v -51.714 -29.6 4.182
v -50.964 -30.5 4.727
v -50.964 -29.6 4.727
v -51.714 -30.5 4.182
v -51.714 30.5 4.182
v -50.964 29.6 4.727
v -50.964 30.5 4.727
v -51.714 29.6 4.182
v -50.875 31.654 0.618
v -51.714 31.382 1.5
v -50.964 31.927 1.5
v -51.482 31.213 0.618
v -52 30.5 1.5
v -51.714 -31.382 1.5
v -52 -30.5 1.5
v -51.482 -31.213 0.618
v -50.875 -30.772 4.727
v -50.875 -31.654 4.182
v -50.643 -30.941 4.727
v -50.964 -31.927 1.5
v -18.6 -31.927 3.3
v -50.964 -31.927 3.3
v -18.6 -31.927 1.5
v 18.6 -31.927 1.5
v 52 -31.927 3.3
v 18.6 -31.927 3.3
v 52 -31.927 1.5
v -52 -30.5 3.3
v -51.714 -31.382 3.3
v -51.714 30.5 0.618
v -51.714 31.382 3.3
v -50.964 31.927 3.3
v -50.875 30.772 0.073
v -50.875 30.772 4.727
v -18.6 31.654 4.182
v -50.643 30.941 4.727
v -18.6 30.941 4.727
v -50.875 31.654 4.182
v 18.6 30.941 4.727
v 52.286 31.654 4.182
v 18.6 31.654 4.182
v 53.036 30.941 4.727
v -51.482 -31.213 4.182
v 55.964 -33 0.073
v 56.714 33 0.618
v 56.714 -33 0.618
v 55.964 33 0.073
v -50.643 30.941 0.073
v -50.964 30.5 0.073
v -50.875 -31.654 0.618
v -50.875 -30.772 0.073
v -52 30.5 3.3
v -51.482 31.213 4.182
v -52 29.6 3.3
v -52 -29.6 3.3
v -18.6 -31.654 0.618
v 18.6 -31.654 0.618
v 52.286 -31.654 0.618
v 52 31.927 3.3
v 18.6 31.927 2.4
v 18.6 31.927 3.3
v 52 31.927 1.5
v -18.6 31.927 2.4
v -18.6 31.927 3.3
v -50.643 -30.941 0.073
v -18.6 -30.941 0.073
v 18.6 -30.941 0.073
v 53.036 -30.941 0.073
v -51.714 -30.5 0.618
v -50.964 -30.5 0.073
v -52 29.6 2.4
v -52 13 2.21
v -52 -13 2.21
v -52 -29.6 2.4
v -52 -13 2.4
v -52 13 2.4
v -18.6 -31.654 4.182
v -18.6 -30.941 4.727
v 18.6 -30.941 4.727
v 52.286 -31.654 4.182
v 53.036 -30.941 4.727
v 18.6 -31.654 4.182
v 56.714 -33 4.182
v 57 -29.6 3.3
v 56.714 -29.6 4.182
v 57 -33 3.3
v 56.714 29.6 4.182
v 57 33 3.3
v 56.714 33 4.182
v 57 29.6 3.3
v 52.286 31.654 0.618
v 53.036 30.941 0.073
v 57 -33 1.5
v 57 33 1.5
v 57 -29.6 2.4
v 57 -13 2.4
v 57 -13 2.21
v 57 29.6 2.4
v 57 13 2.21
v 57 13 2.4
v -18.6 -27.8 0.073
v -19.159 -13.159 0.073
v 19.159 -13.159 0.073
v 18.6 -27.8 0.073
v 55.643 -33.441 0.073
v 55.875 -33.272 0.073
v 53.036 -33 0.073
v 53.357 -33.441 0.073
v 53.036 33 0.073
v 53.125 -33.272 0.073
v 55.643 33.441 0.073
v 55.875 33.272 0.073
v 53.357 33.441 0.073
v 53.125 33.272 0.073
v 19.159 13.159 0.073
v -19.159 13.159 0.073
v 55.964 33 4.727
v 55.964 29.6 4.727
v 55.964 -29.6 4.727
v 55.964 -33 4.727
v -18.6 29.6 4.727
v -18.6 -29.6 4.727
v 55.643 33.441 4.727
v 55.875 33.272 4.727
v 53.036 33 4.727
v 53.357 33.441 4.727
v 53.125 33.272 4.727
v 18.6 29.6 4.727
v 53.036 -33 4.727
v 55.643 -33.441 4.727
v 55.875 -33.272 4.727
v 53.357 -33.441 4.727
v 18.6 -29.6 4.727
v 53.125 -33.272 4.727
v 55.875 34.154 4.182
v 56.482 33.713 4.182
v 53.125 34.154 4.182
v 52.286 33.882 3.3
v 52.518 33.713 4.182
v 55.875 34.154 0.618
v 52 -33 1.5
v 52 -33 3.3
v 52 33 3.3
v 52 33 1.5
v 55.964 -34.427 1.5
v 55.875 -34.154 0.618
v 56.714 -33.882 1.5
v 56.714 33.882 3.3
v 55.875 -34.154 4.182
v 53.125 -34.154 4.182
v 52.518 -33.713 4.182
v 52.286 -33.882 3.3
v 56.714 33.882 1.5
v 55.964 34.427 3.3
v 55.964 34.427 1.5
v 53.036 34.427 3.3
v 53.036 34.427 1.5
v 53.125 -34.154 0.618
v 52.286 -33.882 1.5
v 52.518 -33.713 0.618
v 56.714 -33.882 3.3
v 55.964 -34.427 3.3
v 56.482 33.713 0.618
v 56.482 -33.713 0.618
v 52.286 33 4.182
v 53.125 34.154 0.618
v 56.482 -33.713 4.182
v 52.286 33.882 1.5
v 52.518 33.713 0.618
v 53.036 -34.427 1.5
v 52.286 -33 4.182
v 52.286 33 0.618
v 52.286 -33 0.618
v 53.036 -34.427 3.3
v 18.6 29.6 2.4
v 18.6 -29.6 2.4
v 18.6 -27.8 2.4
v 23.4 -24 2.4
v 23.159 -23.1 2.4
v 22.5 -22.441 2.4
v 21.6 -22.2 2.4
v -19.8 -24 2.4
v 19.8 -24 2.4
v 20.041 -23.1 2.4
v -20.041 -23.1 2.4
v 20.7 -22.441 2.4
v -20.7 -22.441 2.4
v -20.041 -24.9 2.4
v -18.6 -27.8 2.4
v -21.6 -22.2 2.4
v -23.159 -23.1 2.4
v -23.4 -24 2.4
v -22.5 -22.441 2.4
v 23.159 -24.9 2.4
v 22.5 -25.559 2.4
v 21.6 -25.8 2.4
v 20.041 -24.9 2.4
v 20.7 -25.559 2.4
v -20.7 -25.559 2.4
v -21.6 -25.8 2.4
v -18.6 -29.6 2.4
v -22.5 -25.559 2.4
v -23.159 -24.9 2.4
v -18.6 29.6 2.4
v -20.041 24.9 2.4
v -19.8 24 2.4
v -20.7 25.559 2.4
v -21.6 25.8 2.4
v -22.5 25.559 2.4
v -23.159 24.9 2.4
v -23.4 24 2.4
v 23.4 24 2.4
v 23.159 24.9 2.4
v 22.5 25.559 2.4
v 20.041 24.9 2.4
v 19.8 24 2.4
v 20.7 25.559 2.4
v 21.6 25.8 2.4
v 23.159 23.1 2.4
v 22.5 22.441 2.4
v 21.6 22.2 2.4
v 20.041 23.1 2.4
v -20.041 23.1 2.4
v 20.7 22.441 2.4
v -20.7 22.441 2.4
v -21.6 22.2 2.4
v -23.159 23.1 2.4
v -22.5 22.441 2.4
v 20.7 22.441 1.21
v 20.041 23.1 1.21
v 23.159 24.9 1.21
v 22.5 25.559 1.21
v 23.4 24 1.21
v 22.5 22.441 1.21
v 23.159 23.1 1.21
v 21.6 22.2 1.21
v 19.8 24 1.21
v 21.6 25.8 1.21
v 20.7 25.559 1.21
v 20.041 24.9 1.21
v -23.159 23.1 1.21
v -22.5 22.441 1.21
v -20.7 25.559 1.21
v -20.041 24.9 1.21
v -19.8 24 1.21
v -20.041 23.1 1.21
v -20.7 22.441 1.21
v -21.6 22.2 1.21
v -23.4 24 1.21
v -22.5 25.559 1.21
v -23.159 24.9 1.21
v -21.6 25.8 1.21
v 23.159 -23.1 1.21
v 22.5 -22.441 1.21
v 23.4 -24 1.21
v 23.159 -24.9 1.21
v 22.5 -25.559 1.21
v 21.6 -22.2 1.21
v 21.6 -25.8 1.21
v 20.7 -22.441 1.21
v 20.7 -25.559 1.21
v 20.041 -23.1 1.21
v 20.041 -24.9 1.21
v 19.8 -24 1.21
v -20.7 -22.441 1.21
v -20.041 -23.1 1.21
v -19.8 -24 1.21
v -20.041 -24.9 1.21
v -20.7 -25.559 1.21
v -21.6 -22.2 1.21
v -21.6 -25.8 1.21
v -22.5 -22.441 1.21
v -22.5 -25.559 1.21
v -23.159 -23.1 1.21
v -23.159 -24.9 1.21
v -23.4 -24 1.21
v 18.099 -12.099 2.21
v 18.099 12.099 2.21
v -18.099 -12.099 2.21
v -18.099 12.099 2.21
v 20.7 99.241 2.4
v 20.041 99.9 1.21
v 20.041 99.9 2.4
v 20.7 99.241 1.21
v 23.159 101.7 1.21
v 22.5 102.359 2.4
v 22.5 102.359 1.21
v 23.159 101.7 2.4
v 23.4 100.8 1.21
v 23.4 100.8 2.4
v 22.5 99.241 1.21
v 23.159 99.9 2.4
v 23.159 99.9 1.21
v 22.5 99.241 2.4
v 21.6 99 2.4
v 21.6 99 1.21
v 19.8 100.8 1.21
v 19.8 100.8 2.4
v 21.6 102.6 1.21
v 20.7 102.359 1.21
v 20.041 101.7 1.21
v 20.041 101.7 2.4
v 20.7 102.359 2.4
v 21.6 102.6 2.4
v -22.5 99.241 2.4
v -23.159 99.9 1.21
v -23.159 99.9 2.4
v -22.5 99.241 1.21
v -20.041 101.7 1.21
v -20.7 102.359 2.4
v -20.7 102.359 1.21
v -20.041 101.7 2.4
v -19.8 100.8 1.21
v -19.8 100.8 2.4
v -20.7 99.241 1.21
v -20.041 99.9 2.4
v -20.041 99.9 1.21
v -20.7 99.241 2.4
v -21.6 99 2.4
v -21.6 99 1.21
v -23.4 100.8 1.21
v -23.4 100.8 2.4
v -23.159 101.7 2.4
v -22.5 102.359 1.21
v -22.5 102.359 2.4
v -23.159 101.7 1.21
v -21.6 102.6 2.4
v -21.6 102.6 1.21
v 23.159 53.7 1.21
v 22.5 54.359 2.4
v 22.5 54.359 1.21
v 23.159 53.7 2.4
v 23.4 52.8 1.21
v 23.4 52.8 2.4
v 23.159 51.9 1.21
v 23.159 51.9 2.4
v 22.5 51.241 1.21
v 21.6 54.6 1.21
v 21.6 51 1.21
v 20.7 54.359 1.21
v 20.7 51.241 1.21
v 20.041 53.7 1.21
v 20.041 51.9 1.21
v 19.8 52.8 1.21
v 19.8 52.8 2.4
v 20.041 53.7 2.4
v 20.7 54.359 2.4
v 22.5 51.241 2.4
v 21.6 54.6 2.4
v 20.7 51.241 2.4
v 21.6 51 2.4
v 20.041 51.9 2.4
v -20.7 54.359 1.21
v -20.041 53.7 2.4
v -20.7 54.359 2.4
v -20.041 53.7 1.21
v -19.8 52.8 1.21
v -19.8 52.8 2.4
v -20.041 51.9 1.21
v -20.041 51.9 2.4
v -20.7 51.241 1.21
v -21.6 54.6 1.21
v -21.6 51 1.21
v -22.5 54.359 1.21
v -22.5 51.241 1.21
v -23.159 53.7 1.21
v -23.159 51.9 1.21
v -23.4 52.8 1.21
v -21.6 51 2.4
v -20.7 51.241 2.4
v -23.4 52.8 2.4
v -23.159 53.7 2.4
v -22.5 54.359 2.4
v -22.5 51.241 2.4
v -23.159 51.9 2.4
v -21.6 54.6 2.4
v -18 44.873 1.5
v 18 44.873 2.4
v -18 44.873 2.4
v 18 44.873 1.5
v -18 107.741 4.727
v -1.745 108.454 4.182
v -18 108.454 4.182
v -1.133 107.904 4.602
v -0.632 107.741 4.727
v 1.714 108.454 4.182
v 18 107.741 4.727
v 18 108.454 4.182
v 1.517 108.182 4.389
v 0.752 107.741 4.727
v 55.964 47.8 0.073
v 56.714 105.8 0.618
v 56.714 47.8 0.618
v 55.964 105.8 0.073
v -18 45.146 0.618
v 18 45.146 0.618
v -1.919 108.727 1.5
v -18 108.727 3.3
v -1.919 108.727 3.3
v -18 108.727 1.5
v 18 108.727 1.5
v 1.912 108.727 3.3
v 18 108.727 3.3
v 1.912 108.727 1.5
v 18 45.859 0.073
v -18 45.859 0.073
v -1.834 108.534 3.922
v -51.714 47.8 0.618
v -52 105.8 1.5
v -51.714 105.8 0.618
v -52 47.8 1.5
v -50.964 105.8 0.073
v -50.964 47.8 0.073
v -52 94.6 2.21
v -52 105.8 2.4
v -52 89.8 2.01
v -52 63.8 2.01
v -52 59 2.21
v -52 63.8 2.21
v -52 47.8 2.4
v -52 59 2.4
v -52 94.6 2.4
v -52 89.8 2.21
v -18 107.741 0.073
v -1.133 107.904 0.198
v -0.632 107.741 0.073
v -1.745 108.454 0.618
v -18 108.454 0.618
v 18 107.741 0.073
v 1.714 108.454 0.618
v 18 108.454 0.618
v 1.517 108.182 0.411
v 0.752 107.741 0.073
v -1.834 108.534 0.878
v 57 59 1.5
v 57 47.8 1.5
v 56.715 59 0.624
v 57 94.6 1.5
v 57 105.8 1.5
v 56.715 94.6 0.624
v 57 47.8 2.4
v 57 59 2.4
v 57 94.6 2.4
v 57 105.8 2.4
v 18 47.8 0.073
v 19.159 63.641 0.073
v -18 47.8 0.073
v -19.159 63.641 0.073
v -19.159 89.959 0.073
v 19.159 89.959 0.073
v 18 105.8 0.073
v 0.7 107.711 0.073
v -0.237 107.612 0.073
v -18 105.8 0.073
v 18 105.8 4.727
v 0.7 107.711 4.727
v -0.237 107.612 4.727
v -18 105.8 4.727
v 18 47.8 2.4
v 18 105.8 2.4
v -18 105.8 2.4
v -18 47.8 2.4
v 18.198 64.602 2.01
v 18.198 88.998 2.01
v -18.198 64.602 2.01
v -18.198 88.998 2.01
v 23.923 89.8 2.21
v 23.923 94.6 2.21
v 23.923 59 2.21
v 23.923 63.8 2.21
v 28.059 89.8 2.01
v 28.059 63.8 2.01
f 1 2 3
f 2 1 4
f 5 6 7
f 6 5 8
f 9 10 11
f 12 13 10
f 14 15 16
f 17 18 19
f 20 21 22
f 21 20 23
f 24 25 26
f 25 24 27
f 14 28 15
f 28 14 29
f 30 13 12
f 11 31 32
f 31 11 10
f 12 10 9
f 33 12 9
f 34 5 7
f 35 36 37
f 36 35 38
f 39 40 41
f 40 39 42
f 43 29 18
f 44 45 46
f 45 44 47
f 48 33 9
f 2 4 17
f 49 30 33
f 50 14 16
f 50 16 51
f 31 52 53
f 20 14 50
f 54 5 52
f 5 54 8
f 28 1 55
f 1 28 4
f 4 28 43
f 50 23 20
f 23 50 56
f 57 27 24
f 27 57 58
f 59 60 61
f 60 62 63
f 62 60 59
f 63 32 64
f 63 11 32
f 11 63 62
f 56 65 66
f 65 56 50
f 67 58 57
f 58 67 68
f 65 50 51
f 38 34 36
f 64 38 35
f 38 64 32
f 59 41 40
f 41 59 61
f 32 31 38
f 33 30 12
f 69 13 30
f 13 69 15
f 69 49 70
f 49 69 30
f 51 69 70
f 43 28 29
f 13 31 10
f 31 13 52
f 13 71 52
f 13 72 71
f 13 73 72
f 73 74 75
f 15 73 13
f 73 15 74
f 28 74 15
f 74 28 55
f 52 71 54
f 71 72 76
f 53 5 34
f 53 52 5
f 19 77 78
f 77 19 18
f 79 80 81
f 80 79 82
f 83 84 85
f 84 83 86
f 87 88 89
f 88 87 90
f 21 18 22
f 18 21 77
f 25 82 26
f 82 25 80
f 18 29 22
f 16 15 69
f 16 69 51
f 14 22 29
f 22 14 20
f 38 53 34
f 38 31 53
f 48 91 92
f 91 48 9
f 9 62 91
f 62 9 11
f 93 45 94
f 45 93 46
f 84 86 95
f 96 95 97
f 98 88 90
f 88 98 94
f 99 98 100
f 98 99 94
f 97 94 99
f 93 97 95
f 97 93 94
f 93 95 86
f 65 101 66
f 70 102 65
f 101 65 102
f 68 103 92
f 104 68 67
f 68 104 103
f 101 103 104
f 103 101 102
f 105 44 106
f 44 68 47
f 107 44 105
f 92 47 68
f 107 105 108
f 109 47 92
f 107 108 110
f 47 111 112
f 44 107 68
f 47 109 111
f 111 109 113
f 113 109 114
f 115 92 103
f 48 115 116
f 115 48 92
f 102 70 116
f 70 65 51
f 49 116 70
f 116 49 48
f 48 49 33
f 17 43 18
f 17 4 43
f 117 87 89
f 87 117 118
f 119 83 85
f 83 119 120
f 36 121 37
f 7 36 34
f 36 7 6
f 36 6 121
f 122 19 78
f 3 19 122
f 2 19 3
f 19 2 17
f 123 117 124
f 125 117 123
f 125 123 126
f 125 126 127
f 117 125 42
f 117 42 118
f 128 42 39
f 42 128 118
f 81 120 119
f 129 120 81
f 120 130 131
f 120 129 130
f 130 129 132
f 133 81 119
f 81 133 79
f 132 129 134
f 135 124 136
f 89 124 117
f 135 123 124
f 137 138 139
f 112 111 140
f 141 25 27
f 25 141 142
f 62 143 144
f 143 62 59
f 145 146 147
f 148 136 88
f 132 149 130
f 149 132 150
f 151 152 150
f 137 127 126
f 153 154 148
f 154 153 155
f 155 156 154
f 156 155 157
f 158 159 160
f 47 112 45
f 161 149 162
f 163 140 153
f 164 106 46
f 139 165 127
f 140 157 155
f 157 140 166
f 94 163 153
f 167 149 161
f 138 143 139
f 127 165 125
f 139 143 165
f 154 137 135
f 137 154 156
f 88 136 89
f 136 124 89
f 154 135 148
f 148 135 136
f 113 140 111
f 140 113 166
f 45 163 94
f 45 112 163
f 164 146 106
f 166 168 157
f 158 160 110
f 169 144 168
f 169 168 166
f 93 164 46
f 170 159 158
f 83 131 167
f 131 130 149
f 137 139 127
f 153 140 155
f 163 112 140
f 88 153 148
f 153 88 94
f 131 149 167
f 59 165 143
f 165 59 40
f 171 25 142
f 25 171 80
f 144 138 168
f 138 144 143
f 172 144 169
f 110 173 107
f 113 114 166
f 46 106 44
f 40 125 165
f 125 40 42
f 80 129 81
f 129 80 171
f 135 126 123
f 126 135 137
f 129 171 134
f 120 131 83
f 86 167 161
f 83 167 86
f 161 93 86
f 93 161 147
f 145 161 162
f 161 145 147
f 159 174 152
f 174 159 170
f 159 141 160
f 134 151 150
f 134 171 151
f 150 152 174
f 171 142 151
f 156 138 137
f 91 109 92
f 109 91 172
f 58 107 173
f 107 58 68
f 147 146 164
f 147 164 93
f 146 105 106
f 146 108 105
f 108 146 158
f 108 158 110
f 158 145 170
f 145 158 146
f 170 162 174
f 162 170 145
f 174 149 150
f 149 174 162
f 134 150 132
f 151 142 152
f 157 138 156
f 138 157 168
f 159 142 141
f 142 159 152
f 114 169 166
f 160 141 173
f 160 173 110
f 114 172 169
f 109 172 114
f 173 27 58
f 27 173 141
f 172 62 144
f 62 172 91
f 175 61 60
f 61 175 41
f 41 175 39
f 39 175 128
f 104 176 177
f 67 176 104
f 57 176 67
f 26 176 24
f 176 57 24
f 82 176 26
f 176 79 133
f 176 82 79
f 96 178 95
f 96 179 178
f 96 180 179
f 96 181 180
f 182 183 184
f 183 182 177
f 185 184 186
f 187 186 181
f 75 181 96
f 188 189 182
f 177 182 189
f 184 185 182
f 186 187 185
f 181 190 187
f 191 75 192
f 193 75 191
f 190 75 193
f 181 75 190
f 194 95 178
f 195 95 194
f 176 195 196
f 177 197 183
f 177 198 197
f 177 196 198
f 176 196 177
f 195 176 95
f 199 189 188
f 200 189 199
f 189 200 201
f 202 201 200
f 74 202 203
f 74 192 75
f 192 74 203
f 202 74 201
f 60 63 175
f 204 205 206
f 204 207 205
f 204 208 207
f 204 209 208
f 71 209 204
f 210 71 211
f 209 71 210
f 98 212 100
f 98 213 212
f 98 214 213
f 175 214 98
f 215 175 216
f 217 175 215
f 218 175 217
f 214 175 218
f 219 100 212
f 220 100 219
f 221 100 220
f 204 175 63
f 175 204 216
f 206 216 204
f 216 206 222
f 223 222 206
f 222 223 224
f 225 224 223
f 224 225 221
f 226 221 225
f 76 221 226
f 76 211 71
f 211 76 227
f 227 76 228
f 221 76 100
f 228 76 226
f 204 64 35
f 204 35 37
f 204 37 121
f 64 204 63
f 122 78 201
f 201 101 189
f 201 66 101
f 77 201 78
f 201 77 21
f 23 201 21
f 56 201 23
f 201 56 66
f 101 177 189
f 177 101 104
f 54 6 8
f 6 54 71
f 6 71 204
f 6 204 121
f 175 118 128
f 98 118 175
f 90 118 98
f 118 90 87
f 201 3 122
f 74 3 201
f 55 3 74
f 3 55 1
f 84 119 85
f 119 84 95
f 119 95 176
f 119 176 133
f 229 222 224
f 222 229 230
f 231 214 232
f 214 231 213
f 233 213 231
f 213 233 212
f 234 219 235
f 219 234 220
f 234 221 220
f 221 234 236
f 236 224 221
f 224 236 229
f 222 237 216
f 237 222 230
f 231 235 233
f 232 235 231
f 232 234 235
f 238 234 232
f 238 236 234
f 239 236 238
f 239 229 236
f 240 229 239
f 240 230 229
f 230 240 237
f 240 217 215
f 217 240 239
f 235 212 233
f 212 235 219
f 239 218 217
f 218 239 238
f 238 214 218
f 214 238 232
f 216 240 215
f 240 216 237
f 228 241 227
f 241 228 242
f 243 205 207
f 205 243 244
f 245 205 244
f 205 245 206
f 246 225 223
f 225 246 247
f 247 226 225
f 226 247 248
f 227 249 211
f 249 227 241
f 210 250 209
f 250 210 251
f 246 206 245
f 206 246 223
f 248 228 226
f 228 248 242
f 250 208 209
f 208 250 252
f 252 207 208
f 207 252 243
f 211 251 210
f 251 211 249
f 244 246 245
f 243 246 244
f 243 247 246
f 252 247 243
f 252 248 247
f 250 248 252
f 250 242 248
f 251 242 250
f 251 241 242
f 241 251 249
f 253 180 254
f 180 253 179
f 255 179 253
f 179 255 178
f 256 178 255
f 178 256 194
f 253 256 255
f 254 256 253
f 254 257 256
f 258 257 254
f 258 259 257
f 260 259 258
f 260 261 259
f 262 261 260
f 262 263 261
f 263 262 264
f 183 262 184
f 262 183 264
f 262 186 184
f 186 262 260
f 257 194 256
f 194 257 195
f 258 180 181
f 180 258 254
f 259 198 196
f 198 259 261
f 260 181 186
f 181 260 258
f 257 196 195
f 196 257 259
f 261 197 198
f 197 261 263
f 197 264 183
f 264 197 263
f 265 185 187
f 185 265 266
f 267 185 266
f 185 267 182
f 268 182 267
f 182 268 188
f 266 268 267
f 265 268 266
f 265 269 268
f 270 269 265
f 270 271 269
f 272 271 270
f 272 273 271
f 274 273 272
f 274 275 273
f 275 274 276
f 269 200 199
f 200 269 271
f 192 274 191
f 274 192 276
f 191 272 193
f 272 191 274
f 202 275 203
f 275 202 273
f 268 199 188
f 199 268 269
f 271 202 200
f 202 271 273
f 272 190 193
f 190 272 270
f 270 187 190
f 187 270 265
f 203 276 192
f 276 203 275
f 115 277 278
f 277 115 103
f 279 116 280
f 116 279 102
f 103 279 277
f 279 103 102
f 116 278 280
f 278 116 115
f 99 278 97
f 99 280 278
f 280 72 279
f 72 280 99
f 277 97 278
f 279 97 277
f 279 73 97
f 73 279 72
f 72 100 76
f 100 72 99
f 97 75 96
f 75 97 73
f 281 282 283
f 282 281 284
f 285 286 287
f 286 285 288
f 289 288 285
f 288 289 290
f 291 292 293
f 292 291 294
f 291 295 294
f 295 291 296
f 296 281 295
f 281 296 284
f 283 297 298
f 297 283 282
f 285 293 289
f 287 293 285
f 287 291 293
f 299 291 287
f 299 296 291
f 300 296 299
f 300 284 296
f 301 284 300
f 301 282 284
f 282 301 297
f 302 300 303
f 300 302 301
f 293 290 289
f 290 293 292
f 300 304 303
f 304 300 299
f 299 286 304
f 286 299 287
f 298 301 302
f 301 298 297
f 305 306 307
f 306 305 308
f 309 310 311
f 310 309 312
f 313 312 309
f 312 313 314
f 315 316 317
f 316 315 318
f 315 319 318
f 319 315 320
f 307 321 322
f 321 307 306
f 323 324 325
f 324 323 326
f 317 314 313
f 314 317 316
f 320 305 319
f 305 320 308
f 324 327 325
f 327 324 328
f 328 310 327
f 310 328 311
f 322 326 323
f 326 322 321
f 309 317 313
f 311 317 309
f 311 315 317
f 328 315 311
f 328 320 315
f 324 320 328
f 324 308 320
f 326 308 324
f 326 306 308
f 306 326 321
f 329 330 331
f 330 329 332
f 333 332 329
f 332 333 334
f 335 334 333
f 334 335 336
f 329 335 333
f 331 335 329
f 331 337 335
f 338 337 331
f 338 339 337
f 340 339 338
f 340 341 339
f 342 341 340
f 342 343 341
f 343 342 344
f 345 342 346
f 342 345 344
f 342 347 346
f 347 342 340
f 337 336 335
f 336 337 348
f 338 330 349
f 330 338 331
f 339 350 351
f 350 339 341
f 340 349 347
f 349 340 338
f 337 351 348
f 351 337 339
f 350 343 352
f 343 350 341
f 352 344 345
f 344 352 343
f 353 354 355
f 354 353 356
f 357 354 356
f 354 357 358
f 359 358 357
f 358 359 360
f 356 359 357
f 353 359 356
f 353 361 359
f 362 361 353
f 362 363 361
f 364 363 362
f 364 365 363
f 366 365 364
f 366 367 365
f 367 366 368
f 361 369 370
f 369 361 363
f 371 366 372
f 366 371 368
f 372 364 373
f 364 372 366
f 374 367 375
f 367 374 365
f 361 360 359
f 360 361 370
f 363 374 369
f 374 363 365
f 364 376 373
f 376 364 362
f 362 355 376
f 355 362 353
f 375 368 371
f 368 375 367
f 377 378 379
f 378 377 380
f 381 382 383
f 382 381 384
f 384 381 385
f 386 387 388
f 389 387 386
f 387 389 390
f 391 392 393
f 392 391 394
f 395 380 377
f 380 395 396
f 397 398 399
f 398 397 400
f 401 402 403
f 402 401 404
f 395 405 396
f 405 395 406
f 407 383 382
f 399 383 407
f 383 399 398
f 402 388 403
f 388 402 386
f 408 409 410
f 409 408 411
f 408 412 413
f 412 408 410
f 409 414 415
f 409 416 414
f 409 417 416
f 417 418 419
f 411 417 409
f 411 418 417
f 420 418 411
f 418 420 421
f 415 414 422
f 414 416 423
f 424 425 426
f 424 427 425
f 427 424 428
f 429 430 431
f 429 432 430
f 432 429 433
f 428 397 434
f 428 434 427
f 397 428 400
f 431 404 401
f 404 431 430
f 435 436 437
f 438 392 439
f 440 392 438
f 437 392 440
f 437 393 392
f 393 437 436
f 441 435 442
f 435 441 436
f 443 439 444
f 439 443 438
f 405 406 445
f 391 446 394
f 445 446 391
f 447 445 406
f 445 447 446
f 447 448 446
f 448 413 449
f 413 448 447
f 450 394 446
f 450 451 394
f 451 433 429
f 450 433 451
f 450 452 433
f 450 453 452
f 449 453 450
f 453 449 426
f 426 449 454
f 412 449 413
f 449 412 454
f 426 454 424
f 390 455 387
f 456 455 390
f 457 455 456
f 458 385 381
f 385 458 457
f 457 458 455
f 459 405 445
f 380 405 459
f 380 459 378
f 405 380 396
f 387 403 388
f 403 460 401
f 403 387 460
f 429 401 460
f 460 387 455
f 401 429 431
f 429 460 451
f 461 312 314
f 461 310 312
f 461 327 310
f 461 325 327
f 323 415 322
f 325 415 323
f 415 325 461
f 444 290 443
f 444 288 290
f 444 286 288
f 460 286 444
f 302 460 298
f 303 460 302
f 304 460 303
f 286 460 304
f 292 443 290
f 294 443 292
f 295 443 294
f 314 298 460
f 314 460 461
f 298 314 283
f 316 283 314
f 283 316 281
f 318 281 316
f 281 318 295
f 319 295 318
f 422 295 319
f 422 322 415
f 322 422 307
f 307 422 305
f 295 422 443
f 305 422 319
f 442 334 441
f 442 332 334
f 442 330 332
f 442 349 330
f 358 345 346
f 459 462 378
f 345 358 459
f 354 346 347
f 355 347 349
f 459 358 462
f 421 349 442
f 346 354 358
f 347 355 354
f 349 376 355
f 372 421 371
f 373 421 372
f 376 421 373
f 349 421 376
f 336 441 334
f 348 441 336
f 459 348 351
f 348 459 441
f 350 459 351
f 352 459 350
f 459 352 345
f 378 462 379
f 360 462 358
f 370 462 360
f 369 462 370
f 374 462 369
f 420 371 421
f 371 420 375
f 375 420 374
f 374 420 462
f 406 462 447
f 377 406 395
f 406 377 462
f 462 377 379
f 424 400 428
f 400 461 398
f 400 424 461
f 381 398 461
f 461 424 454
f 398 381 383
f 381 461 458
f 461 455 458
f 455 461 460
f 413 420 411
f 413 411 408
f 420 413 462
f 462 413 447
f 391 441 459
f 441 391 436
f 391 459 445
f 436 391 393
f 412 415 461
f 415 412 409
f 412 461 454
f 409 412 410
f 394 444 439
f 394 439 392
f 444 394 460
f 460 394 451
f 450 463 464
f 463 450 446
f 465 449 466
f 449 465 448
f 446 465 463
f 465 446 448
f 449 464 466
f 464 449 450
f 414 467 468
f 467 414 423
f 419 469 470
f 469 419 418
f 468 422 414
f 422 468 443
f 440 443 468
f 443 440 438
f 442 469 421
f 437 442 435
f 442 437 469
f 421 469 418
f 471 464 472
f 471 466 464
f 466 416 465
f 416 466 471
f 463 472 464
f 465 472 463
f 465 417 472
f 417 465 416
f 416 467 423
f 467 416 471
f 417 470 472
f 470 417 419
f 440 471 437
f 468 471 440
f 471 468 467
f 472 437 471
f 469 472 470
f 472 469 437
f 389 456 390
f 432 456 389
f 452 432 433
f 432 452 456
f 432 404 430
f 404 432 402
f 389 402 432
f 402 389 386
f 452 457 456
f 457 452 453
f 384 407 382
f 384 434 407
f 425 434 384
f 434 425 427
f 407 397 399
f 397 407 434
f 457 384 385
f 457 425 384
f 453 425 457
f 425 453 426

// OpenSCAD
// -*- mode: SCAD ; c-file-style: "ellemtel" ; coding: utf-8 -*-
//
// Holder to scan Minox film strips with a Reflecta ProScan 10T
//
// © 2018 Roland Sieker <ospalh@gmail.com>
// Licence: CC-BY-SA 4.0


// Customizer-code rausgenommen. Hier gibt’s nicht viel zu verstellen.

/* [Global] */

// … to preview. You will get all parts when you click “Create Thing”.
part = "halter"; // [halter: lower part, einsatz: upper part]

// Set this to “render” and click on “Create Thing” when done with the setup.
preview = 1; // [0:render, 1:preview]


preview = true;


// Ausser vielleicht den Filmstreifengrößen.

// *******************
// These are for 135
// *******************
// Comment them out for 110
w_streifen = 35;
w_bild = 24;
l_bild = 36;



// // ********************
// // Try this set for 110
// // ********************
// // Uncomment these in for 110
// w_streifen = 16;
// w_bild = 13;
// l_bild = 17;


// Größen des Halters.

// Länge == Maß in Richtung des Filmlaus.
// Höhe == Maß normal zum Film
// Breite oder Weite == Maß in Richtung Filmkante zu Filmkante

// Die beiden wichtigen. Wenn diese falsch sind passt’s nicht oder wackelt.
h_ue_a = 4.8;  // Höhe über alles
w_gesamt = 64;  // Gesamtbreite

l_scanner = 104;  // Bestimmt die Position der Stoppnase und die Breite
// links. Nach Datenblatt
r_r = 1.5;  // Rundungsradius

l_sr = (l_scanner - l_bild)/2;


// Auch wichtig:
l_zk = 4;  // Länge Zentrierkerbe
b_zk = 4;  // Breite Zentrierkerbe
h_zk = 1.2;  // Tiefe der Zentrierkerbe
w_zk = 1;  // Wand bzw Abstand der Zentrierkerbe vom Rand

l_griff = l_bild;
w_rand = 3;


w_stop = w_gesamt + 5;  // Breite für Klotz, der Durchschieben den Halters verhindert.
l_stop = 5;  // Länge für diesen Klotz
l_ueber = 5; // l_stop;  // Extrabreite rechts. Dient dem Keil und dem Ausziehen des Halters.



l_filmsteg = 0.4;
// Steg zwischen zwei Bildern. Ein mal rüber mit der Düse sollte funktionieren.


// Größen der Haltemagnete
d_mag = 3.6; // großes Loch
h_mag = 1;

w_schraeg = h_ue_a/4;




// *******************************************************
// Extra parameters. These can be changed reasonably safely.


w = 1.8;  // Wall width
p = 1.2;  // Bottom, top plate height
c = 0.6;  // Clearance
c_h = 0.2;  // Spiel in Höhe (Magneten)
angle = 60; // Overhangs much below 60° are a problem for me

// *******************************************************
// Some shortcuts. These shouldn’t be changed

tau = 2 * PI;  // π is still wrong. τ = ⌀ ÷ r

xy_factor = 1/tan(angle);
// To get from a height to a horizontal width inclined correctly
z_factor = tan(angle);  // The other way around

some_distance = 1.2 * w_gesamt;
ms = 0.01;  // Muggeseggele.

// fn for differently sized objects and fs, fa; all for preview or rendering.
pna = 40;
pnb = 15;
pa = 5;
ps = 1;
rna = 180;
rnb = 30;
ra = 1;
rs = 0.1;
function na() = (preview) ? pna : rna;
function nb() = (preview) ? pnb : rnb;
$fs = (preview) ? ps : rs;
$fa = (preview) ? pa : ra;


l_ue_a =  l_sr + l_bild + l_sr + l_ueber;
w_einsatz = w_gesamt - 2 * w_rand;
h_bd = h_ue_a/2;  // Höhe Boden oder Deckel

h_bk = 0.2;  // Höhe Bildkerbe. 0.4 mm (dies × 2) sollte reichen. Für 1. test
w_br = 1;  // Extra Rand für Bildkerbe. (Mit der Perforation haben wir’s.)
l_br = 2;  // Extra Rand für Bildkerbe. (Mit der Perforation haben wir’s.)
h_lkl = 0.75*h_bd;

// *******************************************************
// End setup




// *******************************************************
// Generate the parts


// print_part();
// filmhalter();
// einsatz();
preview_parts();
// stack_parts();



module print_part()
{
   if ("halter" == part)
   {
      filmhalter();
   }
   if ("einsatz" == part)
   {
      einsatz();
   }
}

module preview_parts()
{
   filmhalter();
   translate([0, some_distance, 0])
   {
      einsatz();
   }
}

module stack_parts()
{
   // intersection()
   {
      // color("yellow")
      {
         filmhalter();
      }
      translate([0,0,h_ue_a + ms])
      {
         rotate([180, 0,0])
         {
            // color("red")
            {
               einsatz();
            }
         }
      }
   }
}

// *******************************************************
// Code for the parts themselves


module filmhalter()
{
   difference()
   {
      basis_filmhalter();
      fenster();
      magnetausschnitte(0);
      langnut(w_bild + 2*w_br, h_bk);
      zentrierkerbe(-1);
   }
}

module einsatz()
{
   difference()
   {
      basis_einsatz();
      fenster();
      langnut(w_streifen+c, h_bk);
      langnut(w_bild + 2*w_br, 2*h_bk);
      magnetausschnitte(0);
      leitkeil();
      zentrierkerbe(1);
   }

}


module basis_filmhalter()
{
   translate([0,0,h_bd])
   {
      difference()
      {
         massiver_halter();
         einsatzausschnitt(2*c);
      }
   }
}


module basis_einsatz()
{
   translate([0,0,h_bd])
   {
      intersection()
      {
         massiver_halter();
         rotate([180, 0, 0])
         {
            einsatzausschnitt(0);
         }
      }
   }

}

module massiver_halter()
{
   translate([l_ueber/2, 0, 0])
   {
      rquad(l_ue_a, w_gesamt, h_ue_a);
   }
   translate([l_scanner/2+l_stop/2, 0, 0])
   {
      rquad(l_stop, w_stop, h_ue_a);
   }
}

module rquad(xx, yy, zz)
{
   hull()
   {
      vosp();
      mirror([0,0,1])
      {
         vosp();
      }
   }

   module vosp()
   {
      tosp();
      mirror([0,1,0])
      {
         tosp();
      }
   }
   module tosp()
   {
      osp();
      mirror([1,0,0])
      {
         osp();
      }

   }

   module osp()
   {
      translate([xx/2-r_r, yy/2-r_r, zz/2-r_r])
      {
         sphere(r=r_r);
      }
   }
}


module einsatzausschnitt(ec)
{
   translate([0, 0, h_ue_a])
   {
      cube(
         [l_ue_a+2*ms + 2*l_ueber, w_einsatz + ec, 2*h_ue_a],
         center=true);  // Zu lang. Kein Problem

      grip_cut();
   }
   module grip_cut()
   {
      cube([l_griff + ec, w_gesamt + 2*ms, 2*h_ue_a], center=true);
      translate([0, -w_gesamt/2, 0])
      {
         cube([l_griff + ec, 2*w_rand+2*ec, 4*h_ue_a], center=true);
      }
   }
}

module fenster()
{
   translate([0, 0, h_bd])
   {
      hull()
      {
         translate([0,0,-0.5+ms])
         {
            cube([l_bild, w_bild, 1], center=true);
         }
         translate([0,0,-h_bd-0.5-ms])
         {
            cube(
               [l_bild+2*w_schraeg, w_bild+2*w_schraeg, 1], center=true);
         }
      }

   }
}


module magnetausschnitte(mo)
{
   magnetausschnitt(1, 1, mo);
   magnetausschnitt(-1, 1, mo);
   magnetausschnitt(1, -1, mo);
   magnetausschnitt(-1, -1, mo);
}

module magnetausschnitt(xf, yf, mo)
{
   yo_mag = (w_gesamt- w_rand + w_streifen) /4;  // Mittig auf demh Randstück

   // Auserhalb des des GRiffs zum Öffnen
   translate(
      [xf * (l_bild/2+d_mag) , yf * (yo_mag-mo), h_bd - h_mag-c_h + ms])
   {
      cylinder(d=d_mag, h=h_mag+c_h);  // N.B. Spiel ist schon im d_mag
      // eingerechnet
   }
}


module zentrierkerbe(sf)
{
   // Den Radius der Zentrierkerbe kann mensch per Pythagoras bestimmen.
   // Hypothenuse = r_zk
   // 1. Kathete = l_zk/2
   // 2. Kathete = r_zk - h_zk
   // h_zk > 0
   // r_zk * r_zk = l_zk * l_zk / 4 + r_zk * r_zk - 2 * r_zk * h_zk + h_zk * h_zk
   // 0 = l_zk * l_zk / 4 - 2 * r_zk * h_zk + h_zk * h_zk
   // 2 * r_zk * h_zk =
   r_zk = (l_zk * l_zk / 4 + h_zk * h_zk) / (2 * h_zk);
   translate([0, sf*(w_gesamt/2 + r_zk - h_zk), -ms])
   {
      // rotate([90,0,0])
      {
         cylinder(r=r_zk, h=h_ue_a+2*ms);
      }
   }
}


module langnut(kw, kh)
{
   translate([0, 0, h_bd-kh/2+ms])
   {
      cube([l_ue_a+2*ms + 2*l_ueber, kw, kh], center=true);
      // Zu lang. Kein Problem
   }

}


module leitkeil()
{
   xo = l_bild/2+l_br;
   llk = l_scanner/2 - xo + max(l_ueber,l_stop);
   translate([xo, 0, h_bd+ms])
   {
      hull()
      {
         translate([0,0,-ms/2])
         {
            cube([ms, w_streifen + c, ms], center=true);
         }
         translate([llk+ms,0,-h_lkl/2])
         {
            cube([ms, w_streifen + c, h_lkl], center=true);
         }
      }
   }
}
